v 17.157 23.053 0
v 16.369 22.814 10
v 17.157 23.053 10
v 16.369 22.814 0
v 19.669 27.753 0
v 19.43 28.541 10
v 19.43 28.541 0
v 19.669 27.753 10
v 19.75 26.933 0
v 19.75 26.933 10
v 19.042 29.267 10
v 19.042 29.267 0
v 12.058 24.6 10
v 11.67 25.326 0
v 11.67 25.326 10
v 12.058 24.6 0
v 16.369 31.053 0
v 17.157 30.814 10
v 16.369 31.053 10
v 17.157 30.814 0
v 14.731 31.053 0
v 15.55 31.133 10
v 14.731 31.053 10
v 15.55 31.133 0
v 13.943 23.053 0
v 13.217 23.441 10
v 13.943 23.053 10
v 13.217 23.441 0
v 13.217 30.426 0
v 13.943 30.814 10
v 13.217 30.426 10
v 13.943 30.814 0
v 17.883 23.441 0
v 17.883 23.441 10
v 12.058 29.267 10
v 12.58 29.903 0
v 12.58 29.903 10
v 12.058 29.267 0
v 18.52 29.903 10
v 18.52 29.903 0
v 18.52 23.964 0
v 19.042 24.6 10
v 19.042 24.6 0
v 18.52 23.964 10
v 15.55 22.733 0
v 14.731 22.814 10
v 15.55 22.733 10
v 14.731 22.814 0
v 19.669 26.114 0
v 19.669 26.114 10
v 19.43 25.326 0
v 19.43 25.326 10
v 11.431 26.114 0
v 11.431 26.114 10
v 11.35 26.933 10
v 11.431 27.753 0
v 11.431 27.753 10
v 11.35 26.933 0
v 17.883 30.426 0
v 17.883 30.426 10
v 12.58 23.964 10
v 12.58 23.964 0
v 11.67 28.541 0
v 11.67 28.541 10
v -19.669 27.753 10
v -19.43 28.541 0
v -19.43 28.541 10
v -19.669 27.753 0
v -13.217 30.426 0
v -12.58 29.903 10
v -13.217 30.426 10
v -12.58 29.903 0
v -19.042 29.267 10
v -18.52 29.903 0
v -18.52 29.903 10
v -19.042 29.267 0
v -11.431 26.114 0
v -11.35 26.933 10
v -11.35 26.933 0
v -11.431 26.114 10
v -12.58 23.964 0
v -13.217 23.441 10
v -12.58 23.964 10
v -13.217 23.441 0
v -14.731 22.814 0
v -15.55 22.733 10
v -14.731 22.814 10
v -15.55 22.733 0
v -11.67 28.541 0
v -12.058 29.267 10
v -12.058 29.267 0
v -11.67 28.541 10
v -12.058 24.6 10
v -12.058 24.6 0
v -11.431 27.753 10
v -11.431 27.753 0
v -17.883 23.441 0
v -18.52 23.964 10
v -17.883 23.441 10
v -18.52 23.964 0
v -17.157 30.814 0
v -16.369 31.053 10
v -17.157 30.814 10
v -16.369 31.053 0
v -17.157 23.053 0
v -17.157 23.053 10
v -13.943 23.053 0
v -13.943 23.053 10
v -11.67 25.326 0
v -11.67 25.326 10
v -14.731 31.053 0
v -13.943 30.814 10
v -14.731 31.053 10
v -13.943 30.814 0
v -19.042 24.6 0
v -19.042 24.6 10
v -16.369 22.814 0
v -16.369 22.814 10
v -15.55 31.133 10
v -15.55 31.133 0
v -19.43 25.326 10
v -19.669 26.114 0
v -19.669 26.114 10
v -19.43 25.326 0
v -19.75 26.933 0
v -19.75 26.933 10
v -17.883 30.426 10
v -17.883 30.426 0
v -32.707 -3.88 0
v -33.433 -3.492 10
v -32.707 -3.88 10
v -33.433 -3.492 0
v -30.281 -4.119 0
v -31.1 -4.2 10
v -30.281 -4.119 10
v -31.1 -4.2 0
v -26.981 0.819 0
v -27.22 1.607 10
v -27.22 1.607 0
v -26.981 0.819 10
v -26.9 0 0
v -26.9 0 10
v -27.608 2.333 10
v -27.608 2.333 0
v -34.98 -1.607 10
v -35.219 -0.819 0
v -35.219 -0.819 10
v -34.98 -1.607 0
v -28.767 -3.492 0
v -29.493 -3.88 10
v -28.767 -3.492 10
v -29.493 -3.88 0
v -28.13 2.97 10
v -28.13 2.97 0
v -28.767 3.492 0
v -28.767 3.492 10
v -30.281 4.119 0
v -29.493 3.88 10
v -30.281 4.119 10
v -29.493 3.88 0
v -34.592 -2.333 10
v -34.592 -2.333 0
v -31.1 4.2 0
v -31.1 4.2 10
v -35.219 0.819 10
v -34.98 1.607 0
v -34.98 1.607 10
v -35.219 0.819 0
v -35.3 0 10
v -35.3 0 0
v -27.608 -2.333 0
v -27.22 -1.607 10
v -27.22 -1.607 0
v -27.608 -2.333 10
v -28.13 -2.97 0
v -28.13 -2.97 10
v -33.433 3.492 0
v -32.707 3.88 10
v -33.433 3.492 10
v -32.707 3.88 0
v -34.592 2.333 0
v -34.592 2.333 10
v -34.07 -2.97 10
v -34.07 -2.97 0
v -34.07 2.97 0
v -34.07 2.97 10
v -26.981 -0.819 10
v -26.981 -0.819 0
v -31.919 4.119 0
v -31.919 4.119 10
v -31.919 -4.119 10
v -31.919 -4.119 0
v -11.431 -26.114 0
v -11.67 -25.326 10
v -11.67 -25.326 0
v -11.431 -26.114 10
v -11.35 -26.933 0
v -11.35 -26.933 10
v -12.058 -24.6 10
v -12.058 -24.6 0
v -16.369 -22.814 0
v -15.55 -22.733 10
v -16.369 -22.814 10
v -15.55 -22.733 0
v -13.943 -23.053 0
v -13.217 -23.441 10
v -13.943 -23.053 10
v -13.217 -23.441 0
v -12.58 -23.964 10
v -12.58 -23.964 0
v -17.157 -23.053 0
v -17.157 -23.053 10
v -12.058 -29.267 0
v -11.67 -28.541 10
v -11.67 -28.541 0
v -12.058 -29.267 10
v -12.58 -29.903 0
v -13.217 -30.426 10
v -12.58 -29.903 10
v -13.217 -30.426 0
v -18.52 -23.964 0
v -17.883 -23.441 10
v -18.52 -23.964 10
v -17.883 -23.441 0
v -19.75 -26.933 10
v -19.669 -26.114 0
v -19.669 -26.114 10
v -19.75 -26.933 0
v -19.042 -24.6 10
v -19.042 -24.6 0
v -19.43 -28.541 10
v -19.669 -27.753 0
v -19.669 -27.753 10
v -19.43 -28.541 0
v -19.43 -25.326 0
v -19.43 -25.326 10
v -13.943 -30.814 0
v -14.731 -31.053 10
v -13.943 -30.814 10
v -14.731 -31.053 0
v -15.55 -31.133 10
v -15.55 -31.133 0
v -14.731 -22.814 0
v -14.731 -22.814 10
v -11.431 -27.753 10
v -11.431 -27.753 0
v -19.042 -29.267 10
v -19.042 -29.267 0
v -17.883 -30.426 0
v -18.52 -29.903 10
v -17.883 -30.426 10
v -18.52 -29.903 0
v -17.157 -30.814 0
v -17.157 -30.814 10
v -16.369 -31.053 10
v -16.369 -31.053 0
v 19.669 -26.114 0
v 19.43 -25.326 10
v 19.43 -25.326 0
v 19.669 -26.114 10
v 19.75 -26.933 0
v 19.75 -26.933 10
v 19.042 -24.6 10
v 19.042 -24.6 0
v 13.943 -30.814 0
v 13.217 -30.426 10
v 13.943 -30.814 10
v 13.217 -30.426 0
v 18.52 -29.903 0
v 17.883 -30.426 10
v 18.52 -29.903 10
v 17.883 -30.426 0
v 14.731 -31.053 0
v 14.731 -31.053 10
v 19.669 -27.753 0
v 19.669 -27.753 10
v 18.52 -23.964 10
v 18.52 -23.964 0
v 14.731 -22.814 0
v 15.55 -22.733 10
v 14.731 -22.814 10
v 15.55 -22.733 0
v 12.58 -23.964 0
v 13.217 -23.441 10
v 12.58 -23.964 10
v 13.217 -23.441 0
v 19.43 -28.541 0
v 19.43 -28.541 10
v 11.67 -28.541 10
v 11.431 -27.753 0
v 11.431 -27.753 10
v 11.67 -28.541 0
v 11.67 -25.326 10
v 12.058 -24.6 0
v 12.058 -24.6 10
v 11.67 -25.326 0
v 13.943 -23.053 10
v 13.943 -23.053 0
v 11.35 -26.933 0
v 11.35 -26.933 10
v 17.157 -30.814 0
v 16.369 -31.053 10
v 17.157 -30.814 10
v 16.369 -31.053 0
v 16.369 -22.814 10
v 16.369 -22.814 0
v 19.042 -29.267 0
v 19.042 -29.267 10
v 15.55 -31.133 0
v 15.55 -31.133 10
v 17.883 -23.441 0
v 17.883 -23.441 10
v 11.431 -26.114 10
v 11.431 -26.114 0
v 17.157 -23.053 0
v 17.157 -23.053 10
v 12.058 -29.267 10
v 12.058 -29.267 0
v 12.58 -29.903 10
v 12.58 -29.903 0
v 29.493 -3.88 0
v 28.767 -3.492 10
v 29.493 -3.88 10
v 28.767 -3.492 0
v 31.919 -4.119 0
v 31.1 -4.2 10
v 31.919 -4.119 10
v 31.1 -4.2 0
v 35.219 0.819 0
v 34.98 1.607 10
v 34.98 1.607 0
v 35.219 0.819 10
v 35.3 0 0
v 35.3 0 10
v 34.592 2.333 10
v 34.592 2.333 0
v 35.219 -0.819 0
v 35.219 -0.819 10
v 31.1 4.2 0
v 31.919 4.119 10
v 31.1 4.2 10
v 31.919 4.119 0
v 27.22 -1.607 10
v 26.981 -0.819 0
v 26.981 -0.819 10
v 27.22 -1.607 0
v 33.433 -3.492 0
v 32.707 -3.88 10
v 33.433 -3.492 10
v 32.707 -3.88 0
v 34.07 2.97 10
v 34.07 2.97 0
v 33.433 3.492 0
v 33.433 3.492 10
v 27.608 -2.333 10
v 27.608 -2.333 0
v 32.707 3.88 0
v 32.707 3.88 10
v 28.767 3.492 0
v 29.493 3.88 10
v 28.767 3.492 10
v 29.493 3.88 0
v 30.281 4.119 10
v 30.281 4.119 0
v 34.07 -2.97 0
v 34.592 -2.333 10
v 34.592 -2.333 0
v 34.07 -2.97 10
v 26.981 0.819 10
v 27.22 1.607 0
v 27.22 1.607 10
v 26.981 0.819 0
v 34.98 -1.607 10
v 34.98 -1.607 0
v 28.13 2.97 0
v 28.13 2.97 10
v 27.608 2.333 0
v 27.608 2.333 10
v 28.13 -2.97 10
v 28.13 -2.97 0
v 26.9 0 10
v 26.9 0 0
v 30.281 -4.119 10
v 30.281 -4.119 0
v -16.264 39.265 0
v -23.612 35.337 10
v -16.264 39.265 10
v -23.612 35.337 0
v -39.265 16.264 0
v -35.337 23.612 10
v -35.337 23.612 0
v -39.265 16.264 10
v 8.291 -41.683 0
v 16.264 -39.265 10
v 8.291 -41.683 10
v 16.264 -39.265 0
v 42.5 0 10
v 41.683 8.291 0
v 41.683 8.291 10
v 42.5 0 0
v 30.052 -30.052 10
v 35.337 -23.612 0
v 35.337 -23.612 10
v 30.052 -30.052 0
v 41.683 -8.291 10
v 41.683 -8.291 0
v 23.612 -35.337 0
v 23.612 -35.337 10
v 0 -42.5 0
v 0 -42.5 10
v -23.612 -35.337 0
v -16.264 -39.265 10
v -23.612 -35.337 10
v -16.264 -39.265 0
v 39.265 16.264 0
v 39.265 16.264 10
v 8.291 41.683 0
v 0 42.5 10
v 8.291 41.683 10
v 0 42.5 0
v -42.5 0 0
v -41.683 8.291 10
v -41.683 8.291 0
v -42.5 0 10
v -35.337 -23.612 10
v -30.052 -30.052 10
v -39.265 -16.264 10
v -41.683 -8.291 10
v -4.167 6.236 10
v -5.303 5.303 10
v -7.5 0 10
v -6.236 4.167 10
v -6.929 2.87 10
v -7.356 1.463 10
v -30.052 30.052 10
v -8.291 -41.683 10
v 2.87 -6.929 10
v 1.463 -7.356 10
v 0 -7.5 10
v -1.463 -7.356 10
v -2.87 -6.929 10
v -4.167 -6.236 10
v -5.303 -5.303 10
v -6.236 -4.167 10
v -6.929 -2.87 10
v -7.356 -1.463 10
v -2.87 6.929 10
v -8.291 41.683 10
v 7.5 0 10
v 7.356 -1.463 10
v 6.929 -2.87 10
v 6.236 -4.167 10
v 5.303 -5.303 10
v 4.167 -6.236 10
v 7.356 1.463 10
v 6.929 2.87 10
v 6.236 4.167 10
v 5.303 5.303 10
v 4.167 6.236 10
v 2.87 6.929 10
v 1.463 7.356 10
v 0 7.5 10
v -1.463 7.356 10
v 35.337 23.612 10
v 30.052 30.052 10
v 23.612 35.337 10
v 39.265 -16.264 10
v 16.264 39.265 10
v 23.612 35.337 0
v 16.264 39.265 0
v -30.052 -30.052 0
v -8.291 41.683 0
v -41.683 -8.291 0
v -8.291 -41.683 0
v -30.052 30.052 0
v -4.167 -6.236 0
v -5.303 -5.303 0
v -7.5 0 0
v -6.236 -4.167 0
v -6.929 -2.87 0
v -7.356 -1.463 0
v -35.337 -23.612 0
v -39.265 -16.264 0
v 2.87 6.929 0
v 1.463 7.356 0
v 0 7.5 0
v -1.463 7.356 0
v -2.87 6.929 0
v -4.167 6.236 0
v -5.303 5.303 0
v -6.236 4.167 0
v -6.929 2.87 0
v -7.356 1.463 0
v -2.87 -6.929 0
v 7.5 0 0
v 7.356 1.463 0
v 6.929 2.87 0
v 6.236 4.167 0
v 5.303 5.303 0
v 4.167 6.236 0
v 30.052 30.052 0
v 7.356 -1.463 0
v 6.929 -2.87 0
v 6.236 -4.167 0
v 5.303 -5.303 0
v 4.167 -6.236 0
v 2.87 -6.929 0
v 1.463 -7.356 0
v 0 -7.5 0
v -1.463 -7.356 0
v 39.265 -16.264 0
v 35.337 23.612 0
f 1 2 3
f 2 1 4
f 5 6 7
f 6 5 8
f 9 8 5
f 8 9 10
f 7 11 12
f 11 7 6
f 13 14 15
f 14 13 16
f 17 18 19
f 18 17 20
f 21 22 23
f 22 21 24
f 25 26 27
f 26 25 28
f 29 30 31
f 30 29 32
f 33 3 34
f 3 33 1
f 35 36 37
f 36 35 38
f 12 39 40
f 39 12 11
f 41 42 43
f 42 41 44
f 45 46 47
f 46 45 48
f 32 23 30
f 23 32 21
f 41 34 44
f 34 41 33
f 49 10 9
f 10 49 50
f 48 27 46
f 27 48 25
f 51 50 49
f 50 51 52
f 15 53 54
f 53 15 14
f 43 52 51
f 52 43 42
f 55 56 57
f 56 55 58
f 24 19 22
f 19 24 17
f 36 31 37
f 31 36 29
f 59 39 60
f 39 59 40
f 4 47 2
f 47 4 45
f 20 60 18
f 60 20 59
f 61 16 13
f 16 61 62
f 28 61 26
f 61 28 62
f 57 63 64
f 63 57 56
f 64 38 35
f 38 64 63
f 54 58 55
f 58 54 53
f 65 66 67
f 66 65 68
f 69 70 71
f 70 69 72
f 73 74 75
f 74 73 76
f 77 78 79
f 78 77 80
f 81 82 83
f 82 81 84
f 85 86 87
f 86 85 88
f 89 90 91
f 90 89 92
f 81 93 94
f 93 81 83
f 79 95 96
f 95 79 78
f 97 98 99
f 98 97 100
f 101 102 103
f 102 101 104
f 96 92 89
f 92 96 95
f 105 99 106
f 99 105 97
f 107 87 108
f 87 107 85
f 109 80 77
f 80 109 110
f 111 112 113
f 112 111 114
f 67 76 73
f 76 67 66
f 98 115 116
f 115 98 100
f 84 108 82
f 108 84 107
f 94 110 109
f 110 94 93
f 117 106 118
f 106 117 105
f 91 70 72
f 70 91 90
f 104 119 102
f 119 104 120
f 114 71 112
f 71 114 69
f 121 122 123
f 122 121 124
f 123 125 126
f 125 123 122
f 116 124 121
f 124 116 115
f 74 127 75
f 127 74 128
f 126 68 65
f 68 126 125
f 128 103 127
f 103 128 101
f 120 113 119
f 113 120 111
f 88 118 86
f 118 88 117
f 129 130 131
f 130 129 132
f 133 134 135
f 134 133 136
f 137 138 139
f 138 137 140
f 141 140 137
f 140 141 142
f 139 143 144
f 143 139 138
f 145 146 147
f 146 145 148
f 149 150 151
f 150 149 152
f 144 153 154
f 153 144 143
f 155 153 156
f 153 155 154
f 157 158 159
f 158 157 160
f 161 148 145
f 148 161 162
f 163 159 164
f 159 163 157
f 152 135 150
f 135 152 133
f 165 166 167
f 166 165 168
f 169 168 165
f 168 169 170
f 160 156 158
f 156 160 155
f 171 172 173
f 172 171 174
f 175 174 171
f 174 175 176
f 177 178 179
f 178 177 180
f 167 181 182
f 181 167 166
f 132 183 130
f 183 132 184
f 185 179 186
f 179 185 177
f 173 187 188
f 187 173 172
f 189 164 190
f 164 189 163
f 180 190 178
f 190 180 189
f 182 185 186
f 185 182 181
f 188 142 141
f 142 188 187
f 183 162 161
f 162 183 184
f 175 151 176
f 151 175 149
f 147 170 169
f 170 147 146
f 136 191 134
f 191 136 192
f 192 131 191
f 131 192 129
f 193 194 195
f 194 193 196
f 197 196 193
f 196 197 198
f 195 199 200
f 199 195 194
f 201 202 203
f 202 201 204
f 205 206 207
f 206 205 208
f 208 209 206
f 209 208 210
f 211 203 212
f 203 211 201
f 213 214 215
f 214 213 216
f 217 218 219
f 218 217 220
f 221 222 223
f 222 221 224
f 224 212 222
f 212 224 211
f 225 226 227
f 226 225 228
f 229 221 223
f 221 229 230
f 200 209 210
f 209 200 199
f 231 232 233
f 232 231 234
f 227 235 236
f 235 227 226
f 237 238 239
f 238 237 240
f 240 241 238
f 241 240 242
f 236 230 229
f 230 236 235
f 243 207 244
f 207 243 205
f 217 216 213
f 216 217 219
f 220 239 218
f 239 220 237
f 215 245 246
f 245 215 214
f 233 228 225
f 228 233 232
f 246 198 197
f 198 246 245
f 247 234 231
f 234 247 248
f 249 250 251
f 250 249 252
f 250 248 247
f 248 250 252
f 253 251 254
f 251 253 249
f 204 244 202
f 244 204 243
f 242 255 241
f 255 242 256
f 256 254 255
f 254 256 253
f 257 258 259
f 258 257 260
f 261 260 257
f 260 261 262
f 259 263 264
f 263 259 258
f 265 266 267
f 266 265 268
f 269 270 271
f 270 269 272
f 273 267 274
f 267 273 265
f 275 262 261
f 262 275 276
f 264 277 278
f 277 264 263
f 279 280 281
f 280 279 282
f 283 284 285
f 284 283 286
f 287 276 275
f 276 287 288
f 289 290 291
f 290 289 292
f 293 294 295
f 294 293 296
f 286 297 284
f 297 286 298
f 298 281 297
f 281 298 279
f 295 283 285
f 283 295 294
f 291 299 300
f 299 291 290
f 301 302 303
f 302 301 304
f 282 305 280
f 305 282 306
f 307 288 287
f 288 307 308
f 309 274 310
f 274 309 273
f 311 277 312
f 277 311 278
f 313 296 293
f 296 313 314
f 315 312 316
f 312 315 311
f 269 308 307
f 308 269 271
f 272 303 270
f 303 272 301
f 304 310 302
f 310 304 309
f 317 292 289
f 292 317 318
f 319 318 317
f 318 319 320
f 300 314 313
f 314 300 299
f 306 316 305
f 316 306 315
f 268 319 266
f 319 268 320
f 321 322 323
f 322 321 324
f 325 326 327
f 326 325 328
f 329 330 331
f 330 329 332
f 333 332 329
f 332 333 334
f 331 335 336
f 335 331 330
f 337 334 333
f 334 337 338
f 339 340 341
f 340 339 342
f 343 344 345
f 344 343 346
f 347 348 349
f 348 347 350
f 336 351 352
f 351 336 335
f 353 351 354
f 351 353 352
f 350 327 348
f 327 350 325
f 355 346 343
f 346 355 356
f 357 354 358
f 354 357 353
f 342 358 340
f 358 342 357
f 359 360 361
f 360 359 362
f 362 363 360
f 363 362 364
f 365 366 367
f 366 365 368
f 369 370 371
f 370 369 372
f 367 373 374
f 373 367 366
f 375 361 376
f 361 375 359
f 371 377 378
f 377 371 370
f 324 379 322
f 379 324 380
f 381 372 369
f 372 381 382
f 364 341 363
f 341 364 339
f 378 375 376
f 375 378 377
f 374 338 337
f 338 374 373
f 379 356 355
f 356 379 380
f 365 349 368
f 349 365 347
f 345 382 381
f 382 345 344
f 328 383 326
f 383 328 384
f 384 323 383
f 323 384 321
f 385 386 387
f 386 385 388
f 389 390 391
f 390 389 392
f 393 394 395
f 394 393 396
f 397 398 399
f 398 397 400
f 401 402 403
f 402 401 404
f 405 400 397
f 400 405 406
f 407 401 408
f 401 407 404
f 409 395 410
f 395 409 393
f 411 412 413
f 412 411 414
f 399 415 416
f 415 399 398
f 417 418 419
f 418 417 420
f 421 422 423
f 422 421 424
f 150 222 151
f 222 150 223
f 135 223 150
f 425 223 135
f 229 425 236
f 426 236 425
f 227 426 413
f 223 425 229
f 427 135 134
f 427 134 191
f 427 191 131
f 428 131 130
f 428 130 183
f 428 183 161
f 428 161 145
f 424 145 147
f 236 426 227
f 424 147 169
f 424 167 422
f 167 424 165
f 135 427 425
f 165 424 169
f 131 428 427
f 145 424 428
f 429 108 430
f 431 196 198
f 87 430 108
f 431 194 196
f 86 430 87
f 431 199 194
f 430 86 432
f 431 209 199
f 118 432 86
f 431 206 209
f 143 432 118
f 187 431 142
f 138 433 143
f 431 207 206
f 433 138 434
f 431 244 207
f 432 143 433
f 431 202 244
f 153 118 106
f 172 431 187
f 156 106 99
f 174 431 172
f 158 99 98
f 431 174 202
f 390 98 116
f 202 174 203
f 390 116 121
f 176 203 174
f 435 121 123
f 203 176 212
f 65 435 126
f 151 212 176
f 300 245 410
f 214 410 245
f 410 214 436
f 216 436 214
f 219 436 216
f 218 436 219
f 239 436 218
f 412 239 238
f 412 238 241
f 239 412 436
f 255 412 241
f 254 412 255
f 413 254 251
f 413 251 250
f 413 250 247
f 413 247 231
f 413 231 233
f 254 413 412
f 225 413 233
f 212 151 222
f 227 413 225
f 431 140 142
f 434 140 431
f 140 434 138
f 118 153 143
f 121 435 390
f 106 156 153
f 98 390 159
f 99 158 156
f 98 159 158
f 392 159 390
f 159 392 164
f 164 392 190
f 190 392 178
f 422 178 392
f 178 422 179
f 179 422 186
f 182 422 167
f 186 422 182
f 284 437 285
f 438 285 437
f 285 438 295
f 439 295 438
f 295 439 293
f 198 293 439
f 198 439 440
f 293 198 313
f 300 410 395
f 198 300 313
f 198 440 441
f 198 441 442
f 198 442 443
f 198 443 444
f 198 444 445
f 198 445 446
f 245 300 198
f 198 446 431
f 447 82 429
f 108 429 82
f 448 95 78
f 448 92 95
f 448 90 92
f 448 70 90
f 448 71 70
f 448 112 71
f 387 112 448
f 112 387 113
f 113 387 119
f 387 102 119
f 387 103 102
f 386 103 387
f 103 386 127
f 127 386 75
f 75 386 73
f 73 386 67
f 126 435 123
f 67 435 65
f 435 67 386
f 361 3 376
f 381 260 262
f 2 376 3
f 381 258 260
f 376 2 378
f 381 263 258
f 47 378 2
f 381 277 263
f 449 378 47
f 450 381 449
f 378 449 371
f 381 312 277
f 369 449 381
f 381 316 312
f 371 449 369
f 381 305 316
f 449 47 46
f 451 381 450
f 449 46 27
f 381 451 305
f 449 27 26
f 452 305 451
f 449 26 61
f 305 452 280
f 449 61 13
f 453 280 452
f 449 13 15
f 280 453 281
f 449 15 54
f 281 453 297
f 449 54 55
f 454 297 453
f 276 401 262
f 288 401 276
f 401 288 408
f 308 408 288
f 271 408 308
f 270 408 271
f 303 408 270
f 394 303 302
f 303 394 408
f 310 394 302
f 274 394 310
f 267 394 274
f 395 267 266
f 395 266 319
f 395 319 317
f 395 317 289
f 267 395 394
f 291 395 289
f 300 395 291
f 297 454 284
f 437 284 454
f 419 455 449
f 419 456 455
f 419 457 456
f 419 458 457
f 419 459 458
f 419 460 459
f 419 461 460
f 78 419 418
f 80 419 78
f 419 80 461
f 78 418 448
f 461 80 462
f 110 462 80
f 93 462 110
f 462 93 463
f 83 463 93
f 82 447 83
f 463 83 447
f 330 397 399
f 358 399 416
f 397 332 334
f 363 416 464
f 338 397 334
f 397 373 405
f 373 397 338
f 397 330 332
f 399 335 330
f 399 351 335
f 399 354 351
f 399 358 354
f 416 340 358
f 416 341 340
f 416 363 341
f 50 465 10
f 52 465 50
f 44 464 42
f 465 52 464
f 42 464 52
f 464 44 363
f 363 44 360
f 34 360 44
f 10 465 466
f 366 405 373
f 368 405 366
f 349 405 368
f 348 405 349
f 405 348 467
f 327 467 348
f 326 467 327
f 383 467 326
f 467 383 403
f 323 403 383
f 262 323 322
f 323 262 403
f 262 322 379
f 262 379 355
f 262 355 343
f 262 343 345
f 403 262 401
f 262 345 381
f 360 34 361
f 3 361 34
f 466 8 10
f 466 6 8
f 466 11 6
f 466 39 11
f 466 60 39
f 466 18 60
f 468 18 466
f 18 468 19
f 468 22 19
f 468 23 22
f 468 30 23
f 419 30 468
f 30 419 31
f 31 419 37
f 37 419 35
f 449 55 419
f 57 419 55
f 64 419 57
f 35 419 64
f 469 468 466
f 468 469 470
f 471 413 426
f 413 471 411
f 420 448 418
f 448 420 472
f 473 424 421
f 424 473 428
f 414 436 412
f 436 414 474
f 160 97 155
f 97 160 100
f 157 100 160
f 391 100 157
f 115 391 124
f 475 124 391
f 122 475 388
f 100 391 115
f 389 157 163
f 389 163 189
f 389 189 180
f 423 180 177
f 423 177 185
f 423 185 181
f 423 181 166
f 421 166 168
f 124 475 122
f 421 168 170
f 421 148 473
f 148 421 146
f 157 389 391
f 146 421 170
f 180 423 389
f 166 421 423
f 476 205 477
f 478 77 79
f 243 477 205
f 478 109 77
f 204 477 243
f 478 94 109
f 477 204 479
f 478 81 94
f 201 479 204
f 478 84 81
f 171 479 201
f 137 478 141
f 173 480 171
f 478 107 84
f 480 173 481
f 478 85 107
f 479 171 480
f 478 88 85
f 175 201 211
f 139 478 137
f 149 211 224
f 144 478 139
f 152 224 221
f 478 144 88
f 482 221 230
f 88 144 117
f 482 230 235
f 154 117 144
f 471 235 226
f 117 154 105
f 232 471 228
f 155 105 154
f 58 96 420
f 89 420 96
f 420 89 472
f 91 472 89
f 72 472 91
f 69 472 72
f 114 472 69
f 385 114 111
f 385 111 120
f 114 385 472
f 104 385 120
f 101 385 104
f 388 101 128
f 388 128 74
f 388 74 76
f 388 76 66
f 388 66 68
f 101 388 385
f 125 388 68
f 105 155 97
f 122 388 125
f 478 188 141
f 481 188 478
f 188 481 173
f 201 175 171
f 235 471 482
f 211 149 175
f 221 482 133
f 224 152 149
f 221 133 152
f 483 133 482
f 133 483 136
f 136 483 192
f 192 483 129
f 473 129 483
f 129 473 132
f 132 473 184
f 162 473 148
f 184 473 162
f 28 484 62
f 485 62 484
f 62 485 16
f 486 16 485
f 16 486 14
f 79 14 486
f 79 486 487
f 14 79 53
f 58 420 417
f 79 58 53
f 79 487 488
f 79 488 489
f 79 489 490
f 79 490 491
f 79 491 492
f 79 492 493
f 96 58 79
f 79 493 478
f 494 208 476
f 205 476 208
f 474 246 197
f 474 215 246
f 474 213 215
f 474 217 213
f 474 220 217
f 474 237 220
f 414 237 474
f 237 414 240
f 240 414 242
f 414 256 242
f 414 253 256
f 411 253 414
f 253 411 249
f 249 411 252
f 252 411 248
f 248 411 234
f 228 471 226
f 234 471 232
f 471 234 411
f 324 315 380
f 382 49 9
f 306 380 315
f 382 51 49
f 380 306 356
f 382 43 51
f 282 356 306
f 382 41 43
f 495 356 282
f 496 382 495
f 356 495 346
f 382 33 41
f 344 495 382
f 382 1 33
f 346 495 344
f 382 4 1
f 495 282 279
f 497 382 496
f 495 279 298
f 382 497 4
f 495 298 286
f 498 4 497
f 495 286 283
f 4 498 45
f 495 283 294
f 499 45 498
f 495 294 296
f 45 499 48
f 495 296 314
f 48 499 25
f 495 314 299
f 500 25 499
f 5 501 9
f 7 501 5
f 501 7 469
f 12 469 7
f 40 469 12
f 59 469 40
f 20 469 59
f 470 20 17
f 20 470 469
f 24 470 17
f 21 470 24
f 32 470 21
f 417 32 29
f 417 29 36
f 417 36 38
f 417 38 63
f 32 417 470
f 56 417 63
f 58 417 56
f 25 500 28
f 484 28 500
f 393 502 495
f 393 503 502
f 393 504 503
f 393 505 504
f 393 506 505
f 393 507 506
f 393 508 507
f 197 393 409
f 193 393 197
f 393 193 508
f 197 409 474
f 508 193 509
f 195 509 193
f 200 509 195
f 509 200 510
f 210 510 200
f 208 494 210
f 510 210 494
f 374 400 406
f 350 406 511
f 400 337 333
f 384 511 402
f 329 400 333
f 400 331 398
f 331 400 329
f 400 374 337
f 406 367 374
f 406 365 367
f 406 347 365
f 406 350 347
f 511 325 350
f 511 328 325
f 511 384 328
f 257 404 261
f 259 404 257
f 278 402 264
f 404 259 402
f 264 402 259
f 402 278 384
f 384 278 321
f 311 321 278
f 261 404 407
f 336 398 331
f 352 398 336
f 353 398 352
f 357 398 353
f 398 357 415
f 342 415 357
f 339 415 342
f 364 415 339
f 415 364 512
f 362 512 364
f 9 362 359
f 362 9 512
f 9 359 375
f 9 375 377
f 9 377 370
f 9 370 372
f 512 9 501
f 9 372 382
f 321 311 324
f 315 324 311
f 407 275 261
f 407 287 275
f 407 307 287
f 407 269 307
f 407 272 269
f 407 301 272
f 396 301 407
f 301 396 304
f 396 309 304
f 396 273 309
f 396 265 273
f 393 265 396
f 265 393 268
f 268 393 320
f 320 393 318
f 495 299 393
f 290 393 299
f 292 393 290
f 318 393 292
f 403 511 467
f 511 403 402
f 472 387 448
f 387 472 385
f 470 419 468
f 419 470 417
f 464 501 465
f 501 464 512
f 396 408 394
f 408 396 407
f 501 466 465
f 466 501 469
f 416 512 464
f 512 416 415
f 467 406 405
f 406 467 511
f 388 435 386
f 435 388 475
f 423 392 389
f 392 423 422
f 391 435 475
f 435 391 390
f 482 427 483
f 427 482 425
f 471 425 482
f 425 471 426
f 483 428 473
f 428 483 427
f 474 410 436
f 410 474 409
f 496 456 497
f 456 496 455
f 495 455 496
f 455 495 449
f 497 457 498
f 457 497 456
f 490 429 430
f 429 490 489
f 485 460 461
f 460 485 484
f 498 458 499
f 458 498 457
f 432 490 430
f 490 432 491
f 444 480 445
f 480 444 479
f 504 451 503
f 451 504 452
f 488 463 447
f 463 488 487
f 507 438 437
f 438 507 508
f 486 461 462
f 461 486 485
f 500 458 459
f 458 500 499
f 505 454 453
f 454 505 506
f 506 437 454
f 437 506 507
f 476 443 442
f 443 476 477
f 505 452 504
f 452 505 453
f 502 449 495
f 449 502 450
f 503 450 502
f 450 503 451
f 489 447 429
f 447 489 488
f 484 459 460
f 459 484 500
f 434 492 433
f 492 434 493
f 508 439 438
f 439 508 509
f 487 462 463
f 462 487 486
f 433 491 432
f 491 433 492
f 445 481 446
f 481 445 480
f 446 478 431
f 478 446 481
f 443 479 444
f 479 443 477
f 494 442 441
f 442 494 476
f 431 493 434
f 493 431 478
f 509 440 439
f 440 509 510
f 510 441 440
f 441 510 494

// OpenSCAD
$fn = 32;

// ----------------------------------------------------------------------
// Flange Ø85 x 10
// 6 holes on a Ø62.2 bolt circle, bolted joints
// ----------------------------------------------------------------------

// --- parameters (mm) ---
flange_d = 85;   // outside diameter of the flange
thickness = 10;  // flange thickness
holes = 6;       // number of bolt holes
pcd = 62.2;      // bolt circle diameter
start_deg = 60;  // angle of the first hole, from +X
hole_d = 8.4;    // bolt hole diameter
bore_d = 15;     // central through bore
hub_d = 25;      // hub outside diameter
hub_h = 0;       // hub height above the flange face (0 = no hub)

// --- derived feature positions (mm) ---
height = thickness + hub_h;  // = 10   overall height of the part
pcd_r = pcd / 2;             // = 31.1   bolt circle radius
hole_step = 360 / holes;     // = 60   angular pitch
feature_centers = [
  [pcd_r * cos(start_deg + 0 * hole_step), pcd_r * sin(start_deg + 0 * hole_step)],
  [pcd_r * cos(start_deg + 1 * hole_step), pcd_r * sin(start_deg + 1 * hole_step)],
  [pcd_r * cos(start_deg + 2 * hole_step), pcd_r * sin(start_deg + 2 * hole_step)],
  [pcd_r * cos(start_deg + 3 * hole_step), pcd_r * sin(start_deg + 3 * hole_step)],
  [pcd_r * cos(start_deg + 4 * hole_step), pcd_r * sin(start_deg + 4 * hole_step)],
  [pcd_r * cos(start_deg + 5 * hole_step), pcd_r * sin(start_deg + 5 * hole_step)]
];   // bolt hole centres on the pitch circle

// flange disc, every hole and the bore cut straight through
difference() {
  union() {
    cylinder(d = flange_d, h = thickness);
  }
  translate([0, 0, -1]) cylinder(d = bore_d, h = height + 2);  // bore, through
  for (centre = feature_centers)
    translate([centre[0], centre[1], -1]) cylinder(d = hole_d, h = thickness + 2);
}
